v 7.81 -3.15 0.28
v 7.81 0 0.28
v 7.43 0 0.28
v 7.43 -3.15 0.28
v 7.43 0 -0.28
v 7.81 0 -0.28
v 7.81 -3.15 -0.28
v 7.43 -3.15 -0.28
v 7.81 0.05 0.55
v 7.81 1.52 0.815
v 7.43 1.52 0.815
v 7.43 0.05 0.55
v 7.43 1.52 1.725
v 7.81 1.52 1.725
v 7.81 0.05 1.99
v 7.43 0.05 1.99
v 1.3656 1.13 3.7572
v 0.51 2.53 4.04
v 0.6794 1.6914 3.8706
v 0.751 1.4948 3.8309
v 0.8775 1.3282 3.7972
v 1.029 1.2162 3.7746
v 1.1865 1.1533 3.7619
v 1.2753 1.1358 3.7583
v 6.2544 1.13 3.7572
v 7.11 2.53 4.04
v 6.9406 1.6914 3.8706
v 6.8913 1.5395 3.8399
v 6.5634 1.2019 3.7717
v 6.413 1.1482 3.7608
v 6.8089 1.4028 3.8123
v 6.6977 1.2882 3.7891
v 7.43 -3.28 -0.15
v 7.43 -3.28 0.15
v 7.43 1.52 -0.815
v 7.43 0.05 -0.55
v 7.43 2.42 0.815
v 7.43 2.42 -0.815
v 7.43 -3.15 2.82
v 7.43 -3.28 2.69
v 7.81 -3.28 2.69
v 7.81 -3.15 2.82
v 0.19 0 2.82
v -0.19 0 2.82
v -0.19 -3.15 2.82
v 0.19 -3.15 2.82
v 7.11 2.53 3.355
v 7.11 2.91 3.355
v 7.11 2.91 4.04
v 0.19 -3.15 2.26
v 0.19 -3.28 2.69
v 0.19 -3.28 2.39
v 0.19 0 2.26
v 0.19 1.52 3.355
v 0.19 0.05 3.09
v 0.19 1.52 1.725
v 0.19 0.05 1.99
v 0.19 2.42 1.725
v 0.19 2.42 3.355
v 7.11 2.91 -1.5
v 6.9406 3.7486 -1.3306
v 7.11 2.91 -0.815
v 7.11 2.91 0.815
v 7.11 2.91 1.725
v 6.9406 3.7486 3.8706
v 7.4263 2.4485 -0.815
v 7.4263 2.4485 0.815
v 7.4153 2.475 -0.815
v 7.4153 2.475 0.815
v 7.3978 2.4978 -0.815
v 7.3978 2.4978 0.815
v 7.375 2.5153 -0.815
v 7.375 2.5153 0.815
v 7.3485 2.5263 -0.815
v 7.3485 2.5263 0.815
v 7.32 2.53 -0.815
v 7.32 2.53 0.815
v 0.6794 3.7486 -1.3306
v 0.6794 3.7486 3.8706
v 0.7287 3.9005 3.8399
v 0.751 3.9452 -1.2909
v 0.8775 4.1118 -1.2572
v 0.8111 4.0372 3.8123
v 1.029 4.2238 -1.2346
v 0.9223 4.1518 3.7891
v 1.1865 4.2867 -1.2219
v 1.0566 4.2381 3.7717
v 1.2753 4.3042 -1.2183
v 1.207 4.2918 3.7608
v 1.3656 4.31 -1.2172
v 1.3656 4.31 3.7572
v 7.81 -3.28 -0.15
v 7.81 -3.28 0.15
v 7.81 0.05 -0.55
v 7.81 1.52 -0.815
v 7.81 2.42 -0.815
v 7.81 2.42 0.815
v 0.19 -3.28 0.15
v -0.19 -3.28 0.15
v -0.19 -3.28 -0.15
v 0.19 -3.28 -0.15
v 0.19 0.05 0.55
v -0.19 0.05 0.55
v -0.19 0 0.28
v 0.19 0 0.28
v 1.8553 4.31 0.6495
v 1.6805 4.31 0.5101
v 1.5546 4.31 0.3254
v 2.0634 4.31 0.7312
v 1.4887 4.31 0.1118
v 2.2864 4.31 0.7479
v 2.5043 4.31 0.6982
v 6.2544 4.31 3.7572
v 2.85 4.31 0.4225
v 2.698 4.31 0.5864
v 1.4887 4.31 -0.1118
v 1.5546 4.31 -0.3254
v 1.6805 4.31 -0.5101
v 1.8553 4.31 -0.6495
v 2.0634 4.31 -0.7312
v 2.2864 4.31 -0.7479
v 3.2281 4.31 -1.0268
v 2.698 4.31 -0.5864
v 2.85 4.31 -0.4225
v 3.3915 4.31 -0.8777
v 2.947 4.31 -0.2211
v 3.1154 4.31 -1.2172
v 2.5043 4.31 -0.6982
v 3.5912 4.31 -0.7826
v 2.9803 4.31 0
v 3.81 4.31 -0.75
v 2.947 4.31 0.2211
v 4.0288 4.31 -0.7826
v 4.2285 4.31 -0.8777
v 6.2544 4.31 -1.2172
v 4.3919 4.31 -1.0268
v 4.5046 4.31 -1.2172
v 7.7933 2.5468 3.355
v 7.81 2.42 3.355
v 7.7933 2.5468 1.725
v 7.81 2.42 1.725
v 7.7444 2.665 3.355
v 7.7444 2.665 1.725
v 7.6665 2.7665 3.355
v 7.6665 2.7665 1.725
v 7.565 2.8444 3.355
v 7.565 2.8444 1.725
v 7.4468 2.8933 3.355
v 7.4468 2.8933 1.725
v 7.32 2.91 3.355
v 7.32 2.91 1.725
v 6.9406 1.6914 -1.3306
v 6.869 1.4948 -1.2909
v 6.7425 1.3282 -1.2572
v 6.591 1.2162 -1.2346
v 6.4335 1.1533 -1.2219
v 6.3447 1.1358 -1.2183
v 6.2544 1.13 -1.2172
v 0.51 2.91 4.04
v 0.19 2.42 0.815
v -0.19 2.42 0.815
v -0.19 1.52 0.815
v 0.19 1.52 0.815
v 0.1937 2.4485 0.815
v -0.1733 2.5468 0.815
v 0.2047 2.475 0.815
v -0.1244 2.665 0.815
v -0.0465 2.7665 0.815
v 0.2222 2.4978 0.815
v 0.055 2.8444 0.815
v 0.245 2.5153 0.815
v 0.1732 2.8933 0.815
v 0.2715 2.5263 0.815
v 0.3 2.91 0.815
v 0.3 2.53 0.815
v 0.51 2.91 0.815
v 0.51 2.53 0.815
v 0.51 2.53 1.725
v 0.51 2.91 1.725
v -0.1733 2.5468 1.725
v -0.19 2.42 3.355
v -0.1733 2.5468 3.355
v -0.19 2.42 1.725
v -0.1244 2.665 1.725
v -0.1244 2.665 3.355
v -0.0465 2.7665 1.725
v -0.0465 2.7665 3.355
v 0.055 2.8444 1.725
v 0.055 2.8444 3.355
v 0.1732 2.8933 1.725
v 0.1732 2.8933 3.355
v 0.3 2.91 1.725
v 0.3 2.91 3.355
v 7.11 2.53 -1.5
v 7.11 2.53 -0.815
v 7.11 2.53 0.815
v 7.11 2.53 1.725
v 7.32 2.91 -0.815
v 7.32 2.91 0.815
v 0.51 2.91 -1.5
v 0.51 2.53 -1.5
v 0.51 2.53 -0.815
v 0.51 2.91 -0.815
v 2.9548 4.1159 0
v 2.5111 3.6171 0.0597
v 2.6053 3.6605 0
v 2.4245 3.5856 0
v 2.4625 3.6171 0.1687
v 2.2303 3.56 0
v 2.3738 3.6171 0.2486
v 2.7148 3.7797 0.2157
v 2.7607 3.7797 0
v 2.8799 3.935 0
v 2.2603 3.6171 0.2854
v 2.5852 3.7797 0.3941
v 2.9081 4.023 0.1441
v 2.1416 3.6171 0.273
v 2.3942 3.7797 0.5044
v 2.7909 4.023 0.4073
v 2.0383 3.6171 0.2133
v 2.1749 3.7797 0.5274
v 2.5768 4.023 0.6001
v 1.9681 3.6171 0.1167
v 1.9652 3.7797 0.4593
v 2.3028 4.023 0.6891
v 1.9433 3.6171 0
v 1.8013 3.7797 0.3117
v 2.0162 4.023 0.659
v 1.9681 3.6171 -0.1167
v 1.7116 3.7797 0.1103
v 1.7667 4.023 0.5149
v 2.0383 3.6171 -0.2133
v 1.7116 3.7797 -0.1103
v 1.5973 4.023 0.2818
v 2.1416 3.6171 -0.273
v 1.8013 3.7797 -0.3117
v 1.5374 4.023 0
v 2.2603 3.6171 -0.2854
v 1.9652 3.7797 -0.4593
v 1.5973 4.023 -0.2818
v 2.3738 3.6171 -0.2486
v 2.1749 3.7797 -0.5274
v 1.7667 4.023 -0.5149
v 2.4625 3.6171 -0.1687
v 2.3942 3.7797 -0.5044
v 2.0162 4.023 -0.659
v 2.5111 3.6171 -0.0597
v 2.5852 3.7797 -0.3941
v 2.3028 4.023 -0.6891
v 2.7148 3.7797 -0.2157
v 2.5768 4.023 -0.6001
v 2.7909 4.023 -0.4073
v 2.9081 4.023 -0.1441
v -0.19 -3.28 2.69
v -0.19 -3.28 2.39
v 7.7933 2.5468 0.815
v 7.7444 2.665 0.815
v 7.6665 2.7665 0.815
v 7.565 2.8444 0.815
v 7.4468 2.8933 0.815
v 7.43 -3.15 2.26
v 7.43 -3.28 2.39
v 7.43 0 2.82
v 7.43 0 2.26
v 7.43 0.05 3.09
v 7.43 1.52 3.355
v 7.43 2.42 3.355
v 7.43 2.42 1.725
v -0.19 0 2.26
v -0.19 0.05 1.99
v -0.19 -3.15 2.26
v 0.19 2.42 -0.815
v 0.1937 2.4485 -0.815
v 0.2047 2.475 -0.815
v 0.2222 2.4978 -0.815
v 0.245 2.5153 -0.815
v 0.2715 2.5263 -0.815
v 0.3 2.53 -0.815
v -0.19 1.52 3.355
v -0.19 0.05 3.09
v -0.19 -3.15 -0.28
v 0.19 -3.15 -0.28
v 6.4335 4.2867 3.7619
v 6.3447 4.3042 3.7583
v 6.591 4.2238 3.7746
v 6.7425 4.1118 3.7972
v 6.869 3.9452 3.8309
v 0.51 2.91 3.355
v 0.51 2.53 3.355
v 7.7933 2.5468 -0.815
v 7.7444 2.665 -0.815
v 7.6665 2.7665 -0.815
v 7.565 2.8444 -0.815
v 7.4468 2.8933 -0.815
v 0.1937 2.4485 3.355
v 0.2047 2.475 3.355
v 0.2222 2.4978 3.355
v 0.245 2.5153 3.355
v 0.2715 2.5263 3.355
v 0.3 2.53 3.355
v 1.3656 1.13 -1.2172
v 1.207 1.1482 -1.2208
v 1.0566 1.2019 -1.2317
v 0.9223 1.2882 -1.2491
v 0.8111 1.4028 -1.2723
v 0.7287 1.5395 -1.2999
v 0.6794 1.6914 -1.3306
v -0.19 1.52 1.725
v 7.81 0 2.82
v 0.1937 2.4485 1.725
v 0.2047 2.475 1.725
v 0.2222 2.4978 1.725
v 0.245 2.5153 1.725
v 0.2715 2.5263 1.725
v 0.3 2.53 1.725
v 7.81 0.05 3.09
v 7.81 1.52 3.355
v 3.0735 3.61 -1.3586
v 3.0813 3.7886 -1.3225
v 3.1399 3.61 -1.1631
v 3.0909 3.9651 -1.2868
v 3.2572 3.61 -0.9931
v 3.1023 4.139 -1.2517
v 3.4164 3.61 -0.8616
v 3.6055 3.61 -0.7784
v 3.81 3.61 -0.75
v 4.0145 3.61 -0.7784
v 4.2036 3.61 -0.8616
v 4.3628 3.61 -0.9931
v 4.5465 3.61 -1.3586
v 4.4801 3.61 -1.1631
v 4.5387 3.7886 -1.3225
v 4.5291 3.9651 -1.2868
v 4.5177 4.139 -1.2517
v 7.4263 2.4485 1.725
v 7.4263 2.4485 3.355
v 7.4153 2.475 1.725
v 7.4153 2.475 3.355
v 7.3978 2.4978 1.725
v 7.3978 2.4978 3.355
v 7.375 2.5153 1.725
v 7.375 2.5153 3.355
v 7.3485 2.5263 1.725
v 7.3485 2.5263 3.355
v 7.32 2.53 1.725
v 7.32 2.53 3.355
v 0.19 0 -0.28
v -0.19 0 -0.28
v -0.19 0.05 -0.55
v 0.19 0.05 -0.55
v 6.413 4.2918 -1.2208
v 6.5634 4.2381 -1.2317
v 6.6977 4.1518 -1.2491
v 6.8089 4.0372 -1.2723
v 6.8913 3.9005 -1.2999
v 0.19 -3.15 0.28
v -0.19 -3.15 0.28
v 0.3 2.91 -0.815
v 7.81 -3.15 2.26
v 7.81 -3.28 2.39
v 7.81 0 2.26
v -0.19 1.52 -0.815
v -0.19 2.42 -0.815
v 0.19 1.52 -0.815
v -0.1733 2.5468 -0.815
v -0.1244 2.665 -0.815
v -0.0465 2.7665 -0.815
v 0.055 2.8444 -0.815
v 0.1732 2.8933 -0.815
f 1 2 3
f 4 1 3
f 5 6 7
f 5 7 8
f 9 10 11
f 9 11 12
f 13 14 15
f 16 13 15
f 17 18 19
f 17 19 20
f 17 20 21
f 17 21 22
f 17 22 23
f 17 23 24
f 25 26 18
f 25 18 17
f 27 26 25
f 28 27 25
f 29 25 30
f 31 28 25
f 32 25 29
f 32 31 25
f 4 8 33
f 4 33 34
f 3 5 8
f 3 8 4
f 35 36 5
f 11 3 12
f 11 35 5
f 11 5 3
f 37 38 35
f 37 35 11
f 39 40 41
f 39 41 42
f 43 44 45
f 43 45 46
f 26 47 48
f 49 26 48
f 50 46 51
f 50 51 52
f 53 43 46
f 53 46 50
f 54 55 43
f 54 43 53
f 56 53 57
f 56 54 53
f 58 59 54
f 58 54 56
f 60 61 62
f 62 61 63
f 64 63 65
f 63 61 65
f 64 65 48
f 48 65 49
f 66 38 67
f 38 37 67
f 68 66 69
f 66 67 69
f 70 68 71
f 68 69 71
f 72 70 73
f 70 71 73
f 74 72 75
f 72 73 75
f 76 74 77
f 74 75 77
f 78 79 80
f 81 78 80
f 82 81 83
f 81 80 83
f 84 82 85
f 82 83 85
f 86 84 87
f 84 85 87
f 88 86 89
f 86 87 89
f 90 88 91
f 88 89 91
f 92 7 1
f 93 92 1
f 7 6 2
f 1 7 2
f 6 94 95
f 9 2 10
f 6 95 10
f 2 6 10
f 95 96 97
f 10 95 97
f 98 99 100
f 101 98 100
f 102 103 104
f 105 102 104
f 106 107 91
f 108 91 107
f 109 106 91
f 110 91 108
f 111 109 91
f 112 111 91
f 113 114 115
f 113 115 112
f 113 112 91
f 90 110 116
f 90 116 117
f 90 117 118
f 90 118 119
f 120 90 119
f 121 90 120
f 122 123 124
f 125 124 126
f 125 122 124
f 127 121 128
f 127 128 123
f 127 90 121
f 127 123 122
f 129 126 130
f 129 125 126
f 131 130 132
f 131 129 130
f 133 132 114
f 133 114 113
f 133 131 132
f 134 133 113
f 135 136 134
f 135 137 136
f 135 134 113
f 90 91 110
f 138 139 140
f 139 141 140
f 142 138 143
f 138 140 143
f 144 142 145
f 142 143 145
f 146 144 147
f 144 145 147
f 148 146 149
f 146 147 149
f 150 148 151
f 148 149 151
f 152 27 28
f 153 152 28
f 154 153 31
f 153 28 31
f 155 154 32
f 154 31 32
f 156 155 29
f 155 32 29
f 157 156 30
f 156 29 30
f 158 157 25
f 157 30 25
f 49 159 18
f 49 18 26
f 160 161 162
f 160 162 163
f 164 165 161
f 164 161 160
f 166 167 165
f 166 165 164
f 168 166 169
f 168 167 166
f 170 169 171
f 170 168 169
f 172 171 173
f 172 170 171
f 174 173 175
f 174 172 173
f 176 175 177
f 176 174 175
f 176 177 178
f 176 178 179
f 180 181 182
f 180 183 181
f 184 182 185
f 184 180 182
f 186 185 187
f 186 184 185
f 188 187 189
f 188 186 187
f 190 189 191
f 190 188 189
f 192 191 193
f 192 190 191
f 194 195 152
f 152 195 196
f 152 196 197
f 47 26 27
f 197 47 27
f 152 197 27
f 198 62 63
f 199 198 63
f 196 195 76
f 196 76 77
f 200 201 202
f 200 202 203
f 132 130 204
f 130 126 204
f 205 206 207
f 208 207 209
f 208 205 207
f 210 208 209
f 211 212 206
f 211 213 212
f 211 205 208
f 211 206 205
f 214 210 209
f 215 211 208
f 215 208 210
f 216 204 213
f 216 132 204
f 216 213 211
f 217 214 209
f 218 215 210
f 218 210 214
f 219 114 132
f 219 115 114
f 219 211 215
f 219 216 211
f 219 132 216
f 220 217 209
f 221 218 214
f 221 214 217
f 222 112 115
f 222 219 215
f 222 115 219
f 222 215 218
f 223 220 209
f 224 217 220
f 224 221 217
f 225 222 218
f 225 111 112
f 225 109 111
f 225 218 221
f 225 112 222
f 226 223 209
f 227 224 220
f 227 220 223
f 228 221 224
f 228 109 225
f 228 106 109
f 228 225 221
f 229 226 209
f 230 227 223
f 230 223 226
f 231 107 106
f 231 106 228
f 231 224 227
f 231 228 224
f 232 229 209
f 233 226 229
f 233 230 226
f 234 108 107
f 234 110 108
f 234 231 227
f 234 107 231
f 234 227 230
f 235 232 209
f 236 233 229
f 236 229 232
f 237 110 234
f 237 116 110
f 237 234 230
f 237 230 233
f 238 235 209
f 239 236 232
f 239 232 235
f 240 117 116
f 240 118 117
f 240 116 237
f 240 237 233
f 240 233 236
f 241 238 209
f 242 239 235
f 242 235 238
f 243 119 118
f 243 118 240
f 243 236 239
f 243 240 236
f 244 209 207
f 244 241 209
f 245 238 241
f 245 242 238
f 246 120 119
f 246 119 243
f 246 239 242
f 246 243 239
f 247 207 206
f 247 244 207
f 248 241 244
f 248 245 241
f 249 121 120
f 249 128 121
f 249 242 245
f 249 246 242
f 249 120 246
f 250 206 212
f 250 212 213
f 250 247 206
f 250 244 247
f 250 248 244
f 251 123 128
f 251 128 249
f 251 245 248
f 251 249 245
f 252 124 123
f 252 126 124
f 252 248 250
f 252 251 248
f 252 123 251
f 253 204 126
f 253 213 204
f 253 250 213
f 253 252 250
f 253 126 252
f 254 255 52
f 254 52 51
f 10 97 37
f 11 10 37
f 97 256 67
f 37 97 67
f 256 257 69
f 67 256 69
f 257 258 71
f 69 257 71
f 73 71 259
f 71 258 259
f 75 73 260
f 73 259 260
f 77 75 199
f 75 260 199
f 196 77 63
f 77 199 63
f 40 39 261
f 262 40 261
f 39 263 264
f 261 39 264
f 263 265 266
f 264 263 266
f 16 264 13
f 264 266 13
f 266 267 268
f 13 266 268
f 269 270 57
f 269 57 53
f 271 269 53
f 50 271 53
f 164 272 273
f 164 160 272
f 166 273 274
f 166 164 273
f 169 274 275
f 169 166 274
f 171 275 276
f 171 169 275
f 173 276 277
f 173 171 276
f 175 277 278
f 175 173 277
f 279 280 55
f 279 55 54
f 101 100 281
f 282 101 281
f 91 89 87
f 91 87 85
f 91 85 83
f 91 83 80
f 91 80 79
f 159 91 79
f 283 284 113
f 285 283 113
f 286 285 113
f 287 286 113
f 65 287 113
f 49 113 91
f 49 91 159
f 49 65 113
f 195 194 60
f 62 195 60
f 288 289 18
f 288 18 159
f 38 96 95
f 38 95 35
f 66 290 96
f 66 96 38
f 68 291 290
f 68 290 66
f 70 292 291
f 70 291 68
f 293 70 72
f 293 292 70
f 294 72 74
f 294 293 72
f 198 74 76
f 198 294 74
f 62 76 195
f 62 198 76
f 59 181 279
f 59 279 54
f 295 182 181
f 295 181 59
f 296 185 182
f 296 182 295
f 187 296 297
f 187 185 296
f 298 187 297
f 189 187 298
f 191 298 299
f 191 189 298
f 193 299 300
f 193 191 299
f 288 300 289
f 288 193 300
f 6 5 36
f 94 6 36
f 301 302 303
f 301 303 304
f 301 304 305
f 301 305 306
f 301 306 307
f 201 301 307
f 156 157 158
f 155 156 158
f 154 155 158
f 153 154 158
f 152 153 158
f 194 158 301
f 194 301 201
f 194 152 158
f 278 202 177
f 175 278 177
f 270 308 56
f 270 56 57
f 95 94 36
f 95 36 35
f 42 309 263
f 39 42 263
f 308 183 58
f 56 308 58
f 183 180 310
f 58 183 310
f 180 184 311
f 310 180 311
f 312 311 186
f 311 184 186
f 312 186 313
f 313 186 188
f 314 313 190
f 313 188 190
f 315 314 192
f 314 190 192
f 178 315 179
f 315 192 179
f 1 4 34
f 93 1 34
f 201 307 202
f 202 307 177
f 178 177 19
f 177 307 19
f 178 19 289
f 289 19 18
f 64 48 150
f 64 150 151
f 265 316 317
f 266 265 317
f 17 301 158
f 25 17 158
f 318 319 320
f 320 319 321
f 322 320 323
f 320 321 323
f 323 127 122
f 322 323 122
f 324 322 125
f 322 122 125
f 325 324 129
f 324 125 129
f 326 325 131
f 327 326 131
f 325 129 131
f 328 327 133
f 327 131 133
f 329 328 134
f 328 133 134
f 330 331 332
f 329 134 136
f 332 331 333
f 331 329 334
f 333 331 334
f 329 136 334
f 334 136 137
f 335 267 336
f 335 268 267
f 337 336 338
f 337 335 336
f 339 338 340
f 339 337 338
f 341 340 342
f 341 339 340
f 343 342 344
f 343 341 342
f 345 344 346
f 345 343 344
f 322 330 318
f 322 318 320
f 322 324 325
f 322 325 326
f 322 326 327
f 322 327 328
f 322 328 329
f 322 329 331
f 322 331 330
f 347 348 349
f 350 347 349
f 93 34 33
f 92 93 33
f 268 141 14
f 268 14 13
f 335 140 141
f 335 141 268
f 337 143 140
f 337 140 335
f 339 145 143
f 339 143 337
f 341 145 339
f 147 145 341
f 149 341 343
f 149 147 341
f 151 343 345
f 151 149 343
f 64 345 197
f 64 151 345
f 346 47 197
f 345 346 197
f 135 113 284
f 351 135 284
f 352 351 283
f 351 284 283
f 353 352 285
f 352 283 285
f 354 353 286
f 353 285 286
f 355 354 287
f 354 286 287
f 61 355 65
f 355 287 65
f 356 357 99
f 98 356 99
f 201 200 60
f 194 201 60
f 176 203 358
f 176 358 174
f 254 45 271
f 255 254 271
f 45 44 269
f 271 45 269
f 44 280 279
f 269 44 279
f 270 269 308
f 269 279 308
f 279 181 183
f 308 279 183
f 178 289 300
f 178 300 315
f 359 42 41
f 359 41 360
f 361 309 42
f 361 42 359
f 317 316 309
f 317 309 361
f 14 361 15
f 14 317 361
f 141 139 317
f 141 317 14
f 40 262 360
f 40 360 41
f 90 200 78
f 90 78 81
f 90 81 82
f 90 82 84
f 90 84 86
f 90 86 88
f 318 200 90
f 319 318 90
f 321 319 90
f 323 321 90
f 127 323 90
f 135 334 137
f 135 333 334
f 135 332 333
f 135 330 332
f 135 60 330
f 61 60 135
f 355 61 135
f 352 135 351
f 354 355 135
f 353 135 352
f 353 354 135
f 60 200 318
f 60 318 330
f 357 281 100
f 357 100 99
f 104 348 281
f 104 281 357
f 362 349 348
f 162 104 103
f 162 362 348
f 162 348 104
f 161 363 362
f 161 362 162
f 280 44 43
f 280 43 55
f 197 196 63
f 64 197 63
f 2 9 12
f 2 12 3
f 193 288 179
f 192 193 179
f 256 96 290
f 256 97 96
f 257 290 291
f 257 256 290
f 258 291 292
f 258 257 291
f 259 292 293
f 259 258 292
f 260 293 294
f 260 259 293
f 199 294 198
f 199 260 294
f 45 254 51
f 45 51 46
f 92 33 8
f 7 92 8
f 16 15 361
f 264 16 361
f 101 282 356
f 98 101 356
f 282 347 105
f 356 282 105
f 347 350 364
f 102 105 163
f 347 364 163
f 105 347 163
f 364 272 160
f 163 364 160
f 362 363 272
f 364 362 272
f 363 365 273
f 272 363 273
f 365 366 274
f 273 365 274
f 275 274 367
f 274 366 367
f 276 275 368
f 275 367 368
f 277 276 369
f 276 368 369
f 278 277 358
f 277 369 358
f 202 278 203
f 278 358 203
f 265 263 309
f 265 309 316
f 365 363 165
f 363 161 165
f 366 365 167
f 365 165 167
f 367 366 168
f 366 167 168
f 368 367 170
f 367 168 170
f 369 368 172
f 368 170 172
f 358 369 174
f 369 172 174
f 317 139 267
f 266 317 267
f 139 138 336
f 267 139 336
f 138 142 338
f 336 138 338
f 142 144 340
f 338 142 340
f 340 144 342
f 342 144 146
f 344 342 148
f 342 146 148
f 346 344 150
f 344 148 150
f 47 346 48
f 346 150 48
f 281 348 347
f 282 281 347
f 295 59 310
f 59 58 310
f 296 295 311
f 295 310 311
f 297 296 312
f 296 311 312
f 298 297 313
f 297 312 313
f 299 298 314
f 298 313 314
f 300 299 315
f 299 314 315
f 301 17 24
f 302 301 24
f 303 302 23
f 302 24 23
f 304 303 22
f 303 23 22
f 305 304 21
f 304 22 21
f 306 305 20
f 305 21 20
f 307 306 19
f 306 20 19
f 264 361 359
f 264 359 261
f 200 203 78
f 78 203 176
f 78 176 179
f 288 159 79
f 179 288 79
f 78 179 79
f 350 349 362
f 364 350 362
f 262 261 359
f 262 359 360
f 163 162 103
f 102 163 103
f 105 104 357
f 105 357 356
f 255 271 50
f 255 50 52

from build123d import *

# Parameters (mm, degrees)
BASE_EXTRUDE_DEPTH      = 4.04
BASE_EXTRUDE_DEPTH_BACK = 1.5
SKETCH1_W               = 6.6
SKETCH1_H               = 3.18
SKETCH2_OUTSIDE_W       = 10.436
SKETCH2_OUTSIDE_H       = 7.016
CUT_EXTRUDE1_DEPTH      = 10.990985937
SKETCH3_OUTSIDE_W       = 9.376
SKETCH3_OUTSIDE_H       = 7.016
CUT_EXTRUDE2_DEPTH      = 9.857635125
SKETCH5_W               = 1.63
SKETCH5_H               = 0.38
BOSS_EXTRUDE3_DEPTH     = 0.7
SKETCH6_W               = 0.38
SKETCH6_H               = 1.63
BOSS_EXTRUDE4_DEPTH     = 2.53
SKETCH4_W               = 0.38
SKETCH4_H               = 0.56
BOSS_EXTRUDE5_DEPTH     = 3.28
CUT_EXTRUDE5_DEPTH      = 0.38
FILLET1_R               = 0.49
FILLET2_R               = 0.11
FILLET1_OF_MIRROR1_R    = 0.49
FILLET2_OF_MIRROR1_R    = 0.11
SKETCH10_R              = 0.75
CUT_EXTRUDE6_DEPTH      = 0.7


# Read off the part's stored shape, not the designer's step: Mirror2
with BuildPart() as part:
    # Sketch1 → Base-Extrude (new, two sides: drawn at the far end of the back side and taken through both)
    with BuildSketch(Plane.XY.offset(-BASE_EXTRUDE_DEPTH_BACK)):
        with Locations((3.81, 2.72)):
            Rectangle(SKETCH1_W, SKETCH1_H)
    extrude(amount=BASE_EXTRUDE_DEPTH + BASE_EXTRUDE_DEPTH_BACK)

    # Sketch2 outside → Cut-Extrude1 (cut, through all)
    with BuildSketch(Plane.XY.offset(4.04)):
        with Locations((3.81, 2.72)):
            Rectangle(SKETCH2_OUTSIDE_W, SKETCH2_OUTSIDE_H)
        with BuildLine():
            Line((0.51, 2.91), (0.679431307, 3.748623606))
            ThreePointArc((0.679431307, 3.748623606), (0.922305346, 4.151773257), (1.365567952, 4.31))
            Line((1.365567952, 4.31), (6.254432048, 4.31))
            ThreePointArc((6.254432048, 4.31), (6.697694654, 4.151773257), (6.940568693, 3.748623606))
            Line((6.940568693, 3.748623606), (7.11, 2.91))
            Line((7.11, 2.91), (7.11, 2.53))
            Line((7.11, 2.53), (6.940568693, 1.691376394))
            ThreePointArc((6.940568693, 1.691376394), (6.697694654, 1.288226743), (6.254432048, 1.13))
            Line((6.254432048, 1.13), (1.365567952, 1.13))
            ThreePointArc((1.365567952, 1.13), (0.922305346, 1.288226743), (0.679431307, 1.691376394))
            Line((0.679431307, 1.691376394), (0.51, 2.53))
            Line((0.51, 2.53), (0.51, 2.91))
        make_face(mode=Mode.SUBTRACT)
    extrude(amount=-CUT_EXTRUDE1_DEPTH, mode=Mode.SUBTRACT)

    # Sketch3 outside → Cut-Extrude2 (cut, through all)
    with BuildSketch(Plane(origin=(7.11, 0, 0), x_dir=(0, 0, -1), z_dir=(1, 0, 0))):
        with Locations((-1.27, 2.72)):
            Rectangle(SKETCH3_OUTSIDE_W, SKETCH3_OUTSIDE_H)
        Polygon((1.5, 2.91), (1.134316679, 4.72), (-3.674316679, 4.72), (-4.04, 2.91), (-4.04, 2.53), (-3.674316679, 0.72), (1.134316679, 0.72), (1.5, 2.53), align=None, mode=Mode.SUBTRACT)
    extrude(amount=-CUT_EXTRUDE2_DEPTH, mode=Mode.SUBTRACT)

    # Sketch5 → Boss-Extrude3 (add)
    with BuildSketch(Plane.ZY.offset(-0.51)):
        with Locations((0, 2.72)):
            Rectangle(SKETCH5_W, SKETCH5_H)
    boss_extrude3 = extrude(amount=BOSS_EXTRUDE3_DEPTH)

    # Sketch6 → Boss-Extrude4 (add)
    with BuildSketch(Plane.XZ.offset(-2.53)):
        Rectangle(SKETCH6_W, SKETCH6_H)
    boss_extrude4 = extrude(amount=BOSS_EXTRUDE4_DEPTH)

    # Sketch4 → Boss-Extrude5 (add)
    with BuildSketch(Plane(origin=(0, 0, 0), x_dir=(1, 0, 0), z_dir=(0, 1, 0))):
        Rectangle(SKETCH4_W, SKETCH4_H)
    boss_extrude5 = extrude(amount=-BOSS_EXTRUDE5_DEPTH)

    # Sketch7 → Cut-Extrude5 (cut)
    with BuildSketch(Plane.ZY.offset(0.19)):
        Polygon((0.815, 1.52), (0.55, 0.05), (0.28, 0), (0.28, -3.15), (0.15, -3.28), (-0.15, -3.28), (-0.28, -3.15), (-0.28, 0), (-0.55, 0.05), (-0.815, 1.52), (-0.815, -3.78), (0.815, -3.78), align=None)
    cut_extrude5 = extrude(amount=-CUT_EXTRUDE5_DEPTH, mode=Mode.SUBTRACT)

    # Fillet1
    fillet1_edges = [part.edges().sort_by_distance(p)[0] for p in [
        (-0.19, 2.91, 0),
    ]]
    fillet(fillet1_edges, radius=FILLET1_R)

    # Fillet2
    fillet2_edges = [part.edges().sort_by_distance(p)[0] for p in [
        (0.19, 2.53, 0),
    ]]
    fillet(fillet2_edges, radius=FILLET2_R)

    # Mirror1: Boss-Extrude3, Boss-Extrude4, Boss-Extrude5, Cut-Extrude5 across plane
    add(boss_extrude3.mirror(Plane.ZY.offset(-3.81)))
    add(boss_extrude4.mirror(Plane.ZY.offset(-3.81)))
    add(boss_extrude5.mirror(Plane.ZY.offset(-3.81)))
    add(cut_extrude5.mirror(Plane.ZY.offset(-3.81)), mode=Mode.SUBTRACT)

    # Fillet1 of Mirror1
    fillet1_of_mirror1_edges = [part.edges().sort_by_distance(p)[0] for p in [
        (7.81, 2.91, 0),
    ]]
    fillet(fillet1_of_mirror1_edges, radius=FILLET1_OF_MIRROR1_R)

    # Fillet2 of Mirror1
    fillet2_of_mirror1_edges = [part.edges().sort_by_distance(p)[0] for p in [
        (7.43, 2.53, 0),
    ]]
    fillet(fillet2_of_mirror1_edges, radius=FILLET2_OF_MIRROR1_R)

    # Mirror2: part across plane


with BuildPart() as part_1:
    add(part.part)
    add(part.part.mirror(Plane(origin=(0, 0, 1.27), x_dir=(1, 0, 0), z_dir=(0, 0, -1))))

    # Sketch9 → Cut-Revolve1 (revolve, cut)
    with BuildSketch(Plane.XY):
        with BuildLine():
            Line((2.980337349, 4.31), (2.230337349, 4.31))
            Line((2.230337349, 4.31), (2.230337349, 3.56))
            ThreePointArc((2.230337349, 3.56), (2.760667435, 3.779669914), (2.980337349, 4.31))
        make_face()
    revolve(axis=Axis((2.230337349, 5.149947403, 0), (0, -1, 0)), mode=Mode.SUBTRACT)

    # Sketch10 → Cut-Extrude6 (cut)
    with BuildSketch(Plane(origin=(0, 4.31, 0), x_dir=(-1, 0, 0), z_dir=(0, 1, 0))):
        with Locations((-3.81, -1.5)):
            Circle(SKETCH10_R)
    extrude(amount=-CUT_EXTRUDE6_DEPTH, mode=Mode.SUBTRACT)


solid = part_1.part
